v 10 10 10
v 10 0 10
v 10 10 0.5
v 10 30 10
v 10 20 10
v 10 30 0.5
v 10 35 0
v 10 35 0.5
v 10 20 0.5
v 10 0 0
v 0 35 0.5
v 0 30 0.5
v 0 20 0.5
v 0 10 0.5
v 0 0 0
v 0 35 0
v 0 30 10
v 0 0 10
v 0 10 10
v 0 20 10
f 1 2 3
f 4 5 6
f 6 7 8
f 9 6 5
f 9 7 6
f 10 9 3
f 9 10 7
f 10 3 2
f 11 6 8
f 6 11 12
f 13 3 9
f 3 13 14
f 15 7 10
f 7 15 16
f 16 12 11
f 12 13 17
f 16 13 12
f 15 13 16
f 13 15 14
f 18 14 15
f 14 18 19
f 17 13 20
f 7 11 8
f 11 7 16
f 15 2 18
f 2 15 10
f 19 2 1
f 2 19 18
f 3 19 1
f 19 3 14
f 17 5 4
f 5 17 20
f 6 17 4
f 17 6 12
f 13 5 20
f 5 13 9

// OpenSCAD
cube([10,35,.5]);

cube([10,10,10]);

translate([0,20,0]){
cube([10,10,10]);}
